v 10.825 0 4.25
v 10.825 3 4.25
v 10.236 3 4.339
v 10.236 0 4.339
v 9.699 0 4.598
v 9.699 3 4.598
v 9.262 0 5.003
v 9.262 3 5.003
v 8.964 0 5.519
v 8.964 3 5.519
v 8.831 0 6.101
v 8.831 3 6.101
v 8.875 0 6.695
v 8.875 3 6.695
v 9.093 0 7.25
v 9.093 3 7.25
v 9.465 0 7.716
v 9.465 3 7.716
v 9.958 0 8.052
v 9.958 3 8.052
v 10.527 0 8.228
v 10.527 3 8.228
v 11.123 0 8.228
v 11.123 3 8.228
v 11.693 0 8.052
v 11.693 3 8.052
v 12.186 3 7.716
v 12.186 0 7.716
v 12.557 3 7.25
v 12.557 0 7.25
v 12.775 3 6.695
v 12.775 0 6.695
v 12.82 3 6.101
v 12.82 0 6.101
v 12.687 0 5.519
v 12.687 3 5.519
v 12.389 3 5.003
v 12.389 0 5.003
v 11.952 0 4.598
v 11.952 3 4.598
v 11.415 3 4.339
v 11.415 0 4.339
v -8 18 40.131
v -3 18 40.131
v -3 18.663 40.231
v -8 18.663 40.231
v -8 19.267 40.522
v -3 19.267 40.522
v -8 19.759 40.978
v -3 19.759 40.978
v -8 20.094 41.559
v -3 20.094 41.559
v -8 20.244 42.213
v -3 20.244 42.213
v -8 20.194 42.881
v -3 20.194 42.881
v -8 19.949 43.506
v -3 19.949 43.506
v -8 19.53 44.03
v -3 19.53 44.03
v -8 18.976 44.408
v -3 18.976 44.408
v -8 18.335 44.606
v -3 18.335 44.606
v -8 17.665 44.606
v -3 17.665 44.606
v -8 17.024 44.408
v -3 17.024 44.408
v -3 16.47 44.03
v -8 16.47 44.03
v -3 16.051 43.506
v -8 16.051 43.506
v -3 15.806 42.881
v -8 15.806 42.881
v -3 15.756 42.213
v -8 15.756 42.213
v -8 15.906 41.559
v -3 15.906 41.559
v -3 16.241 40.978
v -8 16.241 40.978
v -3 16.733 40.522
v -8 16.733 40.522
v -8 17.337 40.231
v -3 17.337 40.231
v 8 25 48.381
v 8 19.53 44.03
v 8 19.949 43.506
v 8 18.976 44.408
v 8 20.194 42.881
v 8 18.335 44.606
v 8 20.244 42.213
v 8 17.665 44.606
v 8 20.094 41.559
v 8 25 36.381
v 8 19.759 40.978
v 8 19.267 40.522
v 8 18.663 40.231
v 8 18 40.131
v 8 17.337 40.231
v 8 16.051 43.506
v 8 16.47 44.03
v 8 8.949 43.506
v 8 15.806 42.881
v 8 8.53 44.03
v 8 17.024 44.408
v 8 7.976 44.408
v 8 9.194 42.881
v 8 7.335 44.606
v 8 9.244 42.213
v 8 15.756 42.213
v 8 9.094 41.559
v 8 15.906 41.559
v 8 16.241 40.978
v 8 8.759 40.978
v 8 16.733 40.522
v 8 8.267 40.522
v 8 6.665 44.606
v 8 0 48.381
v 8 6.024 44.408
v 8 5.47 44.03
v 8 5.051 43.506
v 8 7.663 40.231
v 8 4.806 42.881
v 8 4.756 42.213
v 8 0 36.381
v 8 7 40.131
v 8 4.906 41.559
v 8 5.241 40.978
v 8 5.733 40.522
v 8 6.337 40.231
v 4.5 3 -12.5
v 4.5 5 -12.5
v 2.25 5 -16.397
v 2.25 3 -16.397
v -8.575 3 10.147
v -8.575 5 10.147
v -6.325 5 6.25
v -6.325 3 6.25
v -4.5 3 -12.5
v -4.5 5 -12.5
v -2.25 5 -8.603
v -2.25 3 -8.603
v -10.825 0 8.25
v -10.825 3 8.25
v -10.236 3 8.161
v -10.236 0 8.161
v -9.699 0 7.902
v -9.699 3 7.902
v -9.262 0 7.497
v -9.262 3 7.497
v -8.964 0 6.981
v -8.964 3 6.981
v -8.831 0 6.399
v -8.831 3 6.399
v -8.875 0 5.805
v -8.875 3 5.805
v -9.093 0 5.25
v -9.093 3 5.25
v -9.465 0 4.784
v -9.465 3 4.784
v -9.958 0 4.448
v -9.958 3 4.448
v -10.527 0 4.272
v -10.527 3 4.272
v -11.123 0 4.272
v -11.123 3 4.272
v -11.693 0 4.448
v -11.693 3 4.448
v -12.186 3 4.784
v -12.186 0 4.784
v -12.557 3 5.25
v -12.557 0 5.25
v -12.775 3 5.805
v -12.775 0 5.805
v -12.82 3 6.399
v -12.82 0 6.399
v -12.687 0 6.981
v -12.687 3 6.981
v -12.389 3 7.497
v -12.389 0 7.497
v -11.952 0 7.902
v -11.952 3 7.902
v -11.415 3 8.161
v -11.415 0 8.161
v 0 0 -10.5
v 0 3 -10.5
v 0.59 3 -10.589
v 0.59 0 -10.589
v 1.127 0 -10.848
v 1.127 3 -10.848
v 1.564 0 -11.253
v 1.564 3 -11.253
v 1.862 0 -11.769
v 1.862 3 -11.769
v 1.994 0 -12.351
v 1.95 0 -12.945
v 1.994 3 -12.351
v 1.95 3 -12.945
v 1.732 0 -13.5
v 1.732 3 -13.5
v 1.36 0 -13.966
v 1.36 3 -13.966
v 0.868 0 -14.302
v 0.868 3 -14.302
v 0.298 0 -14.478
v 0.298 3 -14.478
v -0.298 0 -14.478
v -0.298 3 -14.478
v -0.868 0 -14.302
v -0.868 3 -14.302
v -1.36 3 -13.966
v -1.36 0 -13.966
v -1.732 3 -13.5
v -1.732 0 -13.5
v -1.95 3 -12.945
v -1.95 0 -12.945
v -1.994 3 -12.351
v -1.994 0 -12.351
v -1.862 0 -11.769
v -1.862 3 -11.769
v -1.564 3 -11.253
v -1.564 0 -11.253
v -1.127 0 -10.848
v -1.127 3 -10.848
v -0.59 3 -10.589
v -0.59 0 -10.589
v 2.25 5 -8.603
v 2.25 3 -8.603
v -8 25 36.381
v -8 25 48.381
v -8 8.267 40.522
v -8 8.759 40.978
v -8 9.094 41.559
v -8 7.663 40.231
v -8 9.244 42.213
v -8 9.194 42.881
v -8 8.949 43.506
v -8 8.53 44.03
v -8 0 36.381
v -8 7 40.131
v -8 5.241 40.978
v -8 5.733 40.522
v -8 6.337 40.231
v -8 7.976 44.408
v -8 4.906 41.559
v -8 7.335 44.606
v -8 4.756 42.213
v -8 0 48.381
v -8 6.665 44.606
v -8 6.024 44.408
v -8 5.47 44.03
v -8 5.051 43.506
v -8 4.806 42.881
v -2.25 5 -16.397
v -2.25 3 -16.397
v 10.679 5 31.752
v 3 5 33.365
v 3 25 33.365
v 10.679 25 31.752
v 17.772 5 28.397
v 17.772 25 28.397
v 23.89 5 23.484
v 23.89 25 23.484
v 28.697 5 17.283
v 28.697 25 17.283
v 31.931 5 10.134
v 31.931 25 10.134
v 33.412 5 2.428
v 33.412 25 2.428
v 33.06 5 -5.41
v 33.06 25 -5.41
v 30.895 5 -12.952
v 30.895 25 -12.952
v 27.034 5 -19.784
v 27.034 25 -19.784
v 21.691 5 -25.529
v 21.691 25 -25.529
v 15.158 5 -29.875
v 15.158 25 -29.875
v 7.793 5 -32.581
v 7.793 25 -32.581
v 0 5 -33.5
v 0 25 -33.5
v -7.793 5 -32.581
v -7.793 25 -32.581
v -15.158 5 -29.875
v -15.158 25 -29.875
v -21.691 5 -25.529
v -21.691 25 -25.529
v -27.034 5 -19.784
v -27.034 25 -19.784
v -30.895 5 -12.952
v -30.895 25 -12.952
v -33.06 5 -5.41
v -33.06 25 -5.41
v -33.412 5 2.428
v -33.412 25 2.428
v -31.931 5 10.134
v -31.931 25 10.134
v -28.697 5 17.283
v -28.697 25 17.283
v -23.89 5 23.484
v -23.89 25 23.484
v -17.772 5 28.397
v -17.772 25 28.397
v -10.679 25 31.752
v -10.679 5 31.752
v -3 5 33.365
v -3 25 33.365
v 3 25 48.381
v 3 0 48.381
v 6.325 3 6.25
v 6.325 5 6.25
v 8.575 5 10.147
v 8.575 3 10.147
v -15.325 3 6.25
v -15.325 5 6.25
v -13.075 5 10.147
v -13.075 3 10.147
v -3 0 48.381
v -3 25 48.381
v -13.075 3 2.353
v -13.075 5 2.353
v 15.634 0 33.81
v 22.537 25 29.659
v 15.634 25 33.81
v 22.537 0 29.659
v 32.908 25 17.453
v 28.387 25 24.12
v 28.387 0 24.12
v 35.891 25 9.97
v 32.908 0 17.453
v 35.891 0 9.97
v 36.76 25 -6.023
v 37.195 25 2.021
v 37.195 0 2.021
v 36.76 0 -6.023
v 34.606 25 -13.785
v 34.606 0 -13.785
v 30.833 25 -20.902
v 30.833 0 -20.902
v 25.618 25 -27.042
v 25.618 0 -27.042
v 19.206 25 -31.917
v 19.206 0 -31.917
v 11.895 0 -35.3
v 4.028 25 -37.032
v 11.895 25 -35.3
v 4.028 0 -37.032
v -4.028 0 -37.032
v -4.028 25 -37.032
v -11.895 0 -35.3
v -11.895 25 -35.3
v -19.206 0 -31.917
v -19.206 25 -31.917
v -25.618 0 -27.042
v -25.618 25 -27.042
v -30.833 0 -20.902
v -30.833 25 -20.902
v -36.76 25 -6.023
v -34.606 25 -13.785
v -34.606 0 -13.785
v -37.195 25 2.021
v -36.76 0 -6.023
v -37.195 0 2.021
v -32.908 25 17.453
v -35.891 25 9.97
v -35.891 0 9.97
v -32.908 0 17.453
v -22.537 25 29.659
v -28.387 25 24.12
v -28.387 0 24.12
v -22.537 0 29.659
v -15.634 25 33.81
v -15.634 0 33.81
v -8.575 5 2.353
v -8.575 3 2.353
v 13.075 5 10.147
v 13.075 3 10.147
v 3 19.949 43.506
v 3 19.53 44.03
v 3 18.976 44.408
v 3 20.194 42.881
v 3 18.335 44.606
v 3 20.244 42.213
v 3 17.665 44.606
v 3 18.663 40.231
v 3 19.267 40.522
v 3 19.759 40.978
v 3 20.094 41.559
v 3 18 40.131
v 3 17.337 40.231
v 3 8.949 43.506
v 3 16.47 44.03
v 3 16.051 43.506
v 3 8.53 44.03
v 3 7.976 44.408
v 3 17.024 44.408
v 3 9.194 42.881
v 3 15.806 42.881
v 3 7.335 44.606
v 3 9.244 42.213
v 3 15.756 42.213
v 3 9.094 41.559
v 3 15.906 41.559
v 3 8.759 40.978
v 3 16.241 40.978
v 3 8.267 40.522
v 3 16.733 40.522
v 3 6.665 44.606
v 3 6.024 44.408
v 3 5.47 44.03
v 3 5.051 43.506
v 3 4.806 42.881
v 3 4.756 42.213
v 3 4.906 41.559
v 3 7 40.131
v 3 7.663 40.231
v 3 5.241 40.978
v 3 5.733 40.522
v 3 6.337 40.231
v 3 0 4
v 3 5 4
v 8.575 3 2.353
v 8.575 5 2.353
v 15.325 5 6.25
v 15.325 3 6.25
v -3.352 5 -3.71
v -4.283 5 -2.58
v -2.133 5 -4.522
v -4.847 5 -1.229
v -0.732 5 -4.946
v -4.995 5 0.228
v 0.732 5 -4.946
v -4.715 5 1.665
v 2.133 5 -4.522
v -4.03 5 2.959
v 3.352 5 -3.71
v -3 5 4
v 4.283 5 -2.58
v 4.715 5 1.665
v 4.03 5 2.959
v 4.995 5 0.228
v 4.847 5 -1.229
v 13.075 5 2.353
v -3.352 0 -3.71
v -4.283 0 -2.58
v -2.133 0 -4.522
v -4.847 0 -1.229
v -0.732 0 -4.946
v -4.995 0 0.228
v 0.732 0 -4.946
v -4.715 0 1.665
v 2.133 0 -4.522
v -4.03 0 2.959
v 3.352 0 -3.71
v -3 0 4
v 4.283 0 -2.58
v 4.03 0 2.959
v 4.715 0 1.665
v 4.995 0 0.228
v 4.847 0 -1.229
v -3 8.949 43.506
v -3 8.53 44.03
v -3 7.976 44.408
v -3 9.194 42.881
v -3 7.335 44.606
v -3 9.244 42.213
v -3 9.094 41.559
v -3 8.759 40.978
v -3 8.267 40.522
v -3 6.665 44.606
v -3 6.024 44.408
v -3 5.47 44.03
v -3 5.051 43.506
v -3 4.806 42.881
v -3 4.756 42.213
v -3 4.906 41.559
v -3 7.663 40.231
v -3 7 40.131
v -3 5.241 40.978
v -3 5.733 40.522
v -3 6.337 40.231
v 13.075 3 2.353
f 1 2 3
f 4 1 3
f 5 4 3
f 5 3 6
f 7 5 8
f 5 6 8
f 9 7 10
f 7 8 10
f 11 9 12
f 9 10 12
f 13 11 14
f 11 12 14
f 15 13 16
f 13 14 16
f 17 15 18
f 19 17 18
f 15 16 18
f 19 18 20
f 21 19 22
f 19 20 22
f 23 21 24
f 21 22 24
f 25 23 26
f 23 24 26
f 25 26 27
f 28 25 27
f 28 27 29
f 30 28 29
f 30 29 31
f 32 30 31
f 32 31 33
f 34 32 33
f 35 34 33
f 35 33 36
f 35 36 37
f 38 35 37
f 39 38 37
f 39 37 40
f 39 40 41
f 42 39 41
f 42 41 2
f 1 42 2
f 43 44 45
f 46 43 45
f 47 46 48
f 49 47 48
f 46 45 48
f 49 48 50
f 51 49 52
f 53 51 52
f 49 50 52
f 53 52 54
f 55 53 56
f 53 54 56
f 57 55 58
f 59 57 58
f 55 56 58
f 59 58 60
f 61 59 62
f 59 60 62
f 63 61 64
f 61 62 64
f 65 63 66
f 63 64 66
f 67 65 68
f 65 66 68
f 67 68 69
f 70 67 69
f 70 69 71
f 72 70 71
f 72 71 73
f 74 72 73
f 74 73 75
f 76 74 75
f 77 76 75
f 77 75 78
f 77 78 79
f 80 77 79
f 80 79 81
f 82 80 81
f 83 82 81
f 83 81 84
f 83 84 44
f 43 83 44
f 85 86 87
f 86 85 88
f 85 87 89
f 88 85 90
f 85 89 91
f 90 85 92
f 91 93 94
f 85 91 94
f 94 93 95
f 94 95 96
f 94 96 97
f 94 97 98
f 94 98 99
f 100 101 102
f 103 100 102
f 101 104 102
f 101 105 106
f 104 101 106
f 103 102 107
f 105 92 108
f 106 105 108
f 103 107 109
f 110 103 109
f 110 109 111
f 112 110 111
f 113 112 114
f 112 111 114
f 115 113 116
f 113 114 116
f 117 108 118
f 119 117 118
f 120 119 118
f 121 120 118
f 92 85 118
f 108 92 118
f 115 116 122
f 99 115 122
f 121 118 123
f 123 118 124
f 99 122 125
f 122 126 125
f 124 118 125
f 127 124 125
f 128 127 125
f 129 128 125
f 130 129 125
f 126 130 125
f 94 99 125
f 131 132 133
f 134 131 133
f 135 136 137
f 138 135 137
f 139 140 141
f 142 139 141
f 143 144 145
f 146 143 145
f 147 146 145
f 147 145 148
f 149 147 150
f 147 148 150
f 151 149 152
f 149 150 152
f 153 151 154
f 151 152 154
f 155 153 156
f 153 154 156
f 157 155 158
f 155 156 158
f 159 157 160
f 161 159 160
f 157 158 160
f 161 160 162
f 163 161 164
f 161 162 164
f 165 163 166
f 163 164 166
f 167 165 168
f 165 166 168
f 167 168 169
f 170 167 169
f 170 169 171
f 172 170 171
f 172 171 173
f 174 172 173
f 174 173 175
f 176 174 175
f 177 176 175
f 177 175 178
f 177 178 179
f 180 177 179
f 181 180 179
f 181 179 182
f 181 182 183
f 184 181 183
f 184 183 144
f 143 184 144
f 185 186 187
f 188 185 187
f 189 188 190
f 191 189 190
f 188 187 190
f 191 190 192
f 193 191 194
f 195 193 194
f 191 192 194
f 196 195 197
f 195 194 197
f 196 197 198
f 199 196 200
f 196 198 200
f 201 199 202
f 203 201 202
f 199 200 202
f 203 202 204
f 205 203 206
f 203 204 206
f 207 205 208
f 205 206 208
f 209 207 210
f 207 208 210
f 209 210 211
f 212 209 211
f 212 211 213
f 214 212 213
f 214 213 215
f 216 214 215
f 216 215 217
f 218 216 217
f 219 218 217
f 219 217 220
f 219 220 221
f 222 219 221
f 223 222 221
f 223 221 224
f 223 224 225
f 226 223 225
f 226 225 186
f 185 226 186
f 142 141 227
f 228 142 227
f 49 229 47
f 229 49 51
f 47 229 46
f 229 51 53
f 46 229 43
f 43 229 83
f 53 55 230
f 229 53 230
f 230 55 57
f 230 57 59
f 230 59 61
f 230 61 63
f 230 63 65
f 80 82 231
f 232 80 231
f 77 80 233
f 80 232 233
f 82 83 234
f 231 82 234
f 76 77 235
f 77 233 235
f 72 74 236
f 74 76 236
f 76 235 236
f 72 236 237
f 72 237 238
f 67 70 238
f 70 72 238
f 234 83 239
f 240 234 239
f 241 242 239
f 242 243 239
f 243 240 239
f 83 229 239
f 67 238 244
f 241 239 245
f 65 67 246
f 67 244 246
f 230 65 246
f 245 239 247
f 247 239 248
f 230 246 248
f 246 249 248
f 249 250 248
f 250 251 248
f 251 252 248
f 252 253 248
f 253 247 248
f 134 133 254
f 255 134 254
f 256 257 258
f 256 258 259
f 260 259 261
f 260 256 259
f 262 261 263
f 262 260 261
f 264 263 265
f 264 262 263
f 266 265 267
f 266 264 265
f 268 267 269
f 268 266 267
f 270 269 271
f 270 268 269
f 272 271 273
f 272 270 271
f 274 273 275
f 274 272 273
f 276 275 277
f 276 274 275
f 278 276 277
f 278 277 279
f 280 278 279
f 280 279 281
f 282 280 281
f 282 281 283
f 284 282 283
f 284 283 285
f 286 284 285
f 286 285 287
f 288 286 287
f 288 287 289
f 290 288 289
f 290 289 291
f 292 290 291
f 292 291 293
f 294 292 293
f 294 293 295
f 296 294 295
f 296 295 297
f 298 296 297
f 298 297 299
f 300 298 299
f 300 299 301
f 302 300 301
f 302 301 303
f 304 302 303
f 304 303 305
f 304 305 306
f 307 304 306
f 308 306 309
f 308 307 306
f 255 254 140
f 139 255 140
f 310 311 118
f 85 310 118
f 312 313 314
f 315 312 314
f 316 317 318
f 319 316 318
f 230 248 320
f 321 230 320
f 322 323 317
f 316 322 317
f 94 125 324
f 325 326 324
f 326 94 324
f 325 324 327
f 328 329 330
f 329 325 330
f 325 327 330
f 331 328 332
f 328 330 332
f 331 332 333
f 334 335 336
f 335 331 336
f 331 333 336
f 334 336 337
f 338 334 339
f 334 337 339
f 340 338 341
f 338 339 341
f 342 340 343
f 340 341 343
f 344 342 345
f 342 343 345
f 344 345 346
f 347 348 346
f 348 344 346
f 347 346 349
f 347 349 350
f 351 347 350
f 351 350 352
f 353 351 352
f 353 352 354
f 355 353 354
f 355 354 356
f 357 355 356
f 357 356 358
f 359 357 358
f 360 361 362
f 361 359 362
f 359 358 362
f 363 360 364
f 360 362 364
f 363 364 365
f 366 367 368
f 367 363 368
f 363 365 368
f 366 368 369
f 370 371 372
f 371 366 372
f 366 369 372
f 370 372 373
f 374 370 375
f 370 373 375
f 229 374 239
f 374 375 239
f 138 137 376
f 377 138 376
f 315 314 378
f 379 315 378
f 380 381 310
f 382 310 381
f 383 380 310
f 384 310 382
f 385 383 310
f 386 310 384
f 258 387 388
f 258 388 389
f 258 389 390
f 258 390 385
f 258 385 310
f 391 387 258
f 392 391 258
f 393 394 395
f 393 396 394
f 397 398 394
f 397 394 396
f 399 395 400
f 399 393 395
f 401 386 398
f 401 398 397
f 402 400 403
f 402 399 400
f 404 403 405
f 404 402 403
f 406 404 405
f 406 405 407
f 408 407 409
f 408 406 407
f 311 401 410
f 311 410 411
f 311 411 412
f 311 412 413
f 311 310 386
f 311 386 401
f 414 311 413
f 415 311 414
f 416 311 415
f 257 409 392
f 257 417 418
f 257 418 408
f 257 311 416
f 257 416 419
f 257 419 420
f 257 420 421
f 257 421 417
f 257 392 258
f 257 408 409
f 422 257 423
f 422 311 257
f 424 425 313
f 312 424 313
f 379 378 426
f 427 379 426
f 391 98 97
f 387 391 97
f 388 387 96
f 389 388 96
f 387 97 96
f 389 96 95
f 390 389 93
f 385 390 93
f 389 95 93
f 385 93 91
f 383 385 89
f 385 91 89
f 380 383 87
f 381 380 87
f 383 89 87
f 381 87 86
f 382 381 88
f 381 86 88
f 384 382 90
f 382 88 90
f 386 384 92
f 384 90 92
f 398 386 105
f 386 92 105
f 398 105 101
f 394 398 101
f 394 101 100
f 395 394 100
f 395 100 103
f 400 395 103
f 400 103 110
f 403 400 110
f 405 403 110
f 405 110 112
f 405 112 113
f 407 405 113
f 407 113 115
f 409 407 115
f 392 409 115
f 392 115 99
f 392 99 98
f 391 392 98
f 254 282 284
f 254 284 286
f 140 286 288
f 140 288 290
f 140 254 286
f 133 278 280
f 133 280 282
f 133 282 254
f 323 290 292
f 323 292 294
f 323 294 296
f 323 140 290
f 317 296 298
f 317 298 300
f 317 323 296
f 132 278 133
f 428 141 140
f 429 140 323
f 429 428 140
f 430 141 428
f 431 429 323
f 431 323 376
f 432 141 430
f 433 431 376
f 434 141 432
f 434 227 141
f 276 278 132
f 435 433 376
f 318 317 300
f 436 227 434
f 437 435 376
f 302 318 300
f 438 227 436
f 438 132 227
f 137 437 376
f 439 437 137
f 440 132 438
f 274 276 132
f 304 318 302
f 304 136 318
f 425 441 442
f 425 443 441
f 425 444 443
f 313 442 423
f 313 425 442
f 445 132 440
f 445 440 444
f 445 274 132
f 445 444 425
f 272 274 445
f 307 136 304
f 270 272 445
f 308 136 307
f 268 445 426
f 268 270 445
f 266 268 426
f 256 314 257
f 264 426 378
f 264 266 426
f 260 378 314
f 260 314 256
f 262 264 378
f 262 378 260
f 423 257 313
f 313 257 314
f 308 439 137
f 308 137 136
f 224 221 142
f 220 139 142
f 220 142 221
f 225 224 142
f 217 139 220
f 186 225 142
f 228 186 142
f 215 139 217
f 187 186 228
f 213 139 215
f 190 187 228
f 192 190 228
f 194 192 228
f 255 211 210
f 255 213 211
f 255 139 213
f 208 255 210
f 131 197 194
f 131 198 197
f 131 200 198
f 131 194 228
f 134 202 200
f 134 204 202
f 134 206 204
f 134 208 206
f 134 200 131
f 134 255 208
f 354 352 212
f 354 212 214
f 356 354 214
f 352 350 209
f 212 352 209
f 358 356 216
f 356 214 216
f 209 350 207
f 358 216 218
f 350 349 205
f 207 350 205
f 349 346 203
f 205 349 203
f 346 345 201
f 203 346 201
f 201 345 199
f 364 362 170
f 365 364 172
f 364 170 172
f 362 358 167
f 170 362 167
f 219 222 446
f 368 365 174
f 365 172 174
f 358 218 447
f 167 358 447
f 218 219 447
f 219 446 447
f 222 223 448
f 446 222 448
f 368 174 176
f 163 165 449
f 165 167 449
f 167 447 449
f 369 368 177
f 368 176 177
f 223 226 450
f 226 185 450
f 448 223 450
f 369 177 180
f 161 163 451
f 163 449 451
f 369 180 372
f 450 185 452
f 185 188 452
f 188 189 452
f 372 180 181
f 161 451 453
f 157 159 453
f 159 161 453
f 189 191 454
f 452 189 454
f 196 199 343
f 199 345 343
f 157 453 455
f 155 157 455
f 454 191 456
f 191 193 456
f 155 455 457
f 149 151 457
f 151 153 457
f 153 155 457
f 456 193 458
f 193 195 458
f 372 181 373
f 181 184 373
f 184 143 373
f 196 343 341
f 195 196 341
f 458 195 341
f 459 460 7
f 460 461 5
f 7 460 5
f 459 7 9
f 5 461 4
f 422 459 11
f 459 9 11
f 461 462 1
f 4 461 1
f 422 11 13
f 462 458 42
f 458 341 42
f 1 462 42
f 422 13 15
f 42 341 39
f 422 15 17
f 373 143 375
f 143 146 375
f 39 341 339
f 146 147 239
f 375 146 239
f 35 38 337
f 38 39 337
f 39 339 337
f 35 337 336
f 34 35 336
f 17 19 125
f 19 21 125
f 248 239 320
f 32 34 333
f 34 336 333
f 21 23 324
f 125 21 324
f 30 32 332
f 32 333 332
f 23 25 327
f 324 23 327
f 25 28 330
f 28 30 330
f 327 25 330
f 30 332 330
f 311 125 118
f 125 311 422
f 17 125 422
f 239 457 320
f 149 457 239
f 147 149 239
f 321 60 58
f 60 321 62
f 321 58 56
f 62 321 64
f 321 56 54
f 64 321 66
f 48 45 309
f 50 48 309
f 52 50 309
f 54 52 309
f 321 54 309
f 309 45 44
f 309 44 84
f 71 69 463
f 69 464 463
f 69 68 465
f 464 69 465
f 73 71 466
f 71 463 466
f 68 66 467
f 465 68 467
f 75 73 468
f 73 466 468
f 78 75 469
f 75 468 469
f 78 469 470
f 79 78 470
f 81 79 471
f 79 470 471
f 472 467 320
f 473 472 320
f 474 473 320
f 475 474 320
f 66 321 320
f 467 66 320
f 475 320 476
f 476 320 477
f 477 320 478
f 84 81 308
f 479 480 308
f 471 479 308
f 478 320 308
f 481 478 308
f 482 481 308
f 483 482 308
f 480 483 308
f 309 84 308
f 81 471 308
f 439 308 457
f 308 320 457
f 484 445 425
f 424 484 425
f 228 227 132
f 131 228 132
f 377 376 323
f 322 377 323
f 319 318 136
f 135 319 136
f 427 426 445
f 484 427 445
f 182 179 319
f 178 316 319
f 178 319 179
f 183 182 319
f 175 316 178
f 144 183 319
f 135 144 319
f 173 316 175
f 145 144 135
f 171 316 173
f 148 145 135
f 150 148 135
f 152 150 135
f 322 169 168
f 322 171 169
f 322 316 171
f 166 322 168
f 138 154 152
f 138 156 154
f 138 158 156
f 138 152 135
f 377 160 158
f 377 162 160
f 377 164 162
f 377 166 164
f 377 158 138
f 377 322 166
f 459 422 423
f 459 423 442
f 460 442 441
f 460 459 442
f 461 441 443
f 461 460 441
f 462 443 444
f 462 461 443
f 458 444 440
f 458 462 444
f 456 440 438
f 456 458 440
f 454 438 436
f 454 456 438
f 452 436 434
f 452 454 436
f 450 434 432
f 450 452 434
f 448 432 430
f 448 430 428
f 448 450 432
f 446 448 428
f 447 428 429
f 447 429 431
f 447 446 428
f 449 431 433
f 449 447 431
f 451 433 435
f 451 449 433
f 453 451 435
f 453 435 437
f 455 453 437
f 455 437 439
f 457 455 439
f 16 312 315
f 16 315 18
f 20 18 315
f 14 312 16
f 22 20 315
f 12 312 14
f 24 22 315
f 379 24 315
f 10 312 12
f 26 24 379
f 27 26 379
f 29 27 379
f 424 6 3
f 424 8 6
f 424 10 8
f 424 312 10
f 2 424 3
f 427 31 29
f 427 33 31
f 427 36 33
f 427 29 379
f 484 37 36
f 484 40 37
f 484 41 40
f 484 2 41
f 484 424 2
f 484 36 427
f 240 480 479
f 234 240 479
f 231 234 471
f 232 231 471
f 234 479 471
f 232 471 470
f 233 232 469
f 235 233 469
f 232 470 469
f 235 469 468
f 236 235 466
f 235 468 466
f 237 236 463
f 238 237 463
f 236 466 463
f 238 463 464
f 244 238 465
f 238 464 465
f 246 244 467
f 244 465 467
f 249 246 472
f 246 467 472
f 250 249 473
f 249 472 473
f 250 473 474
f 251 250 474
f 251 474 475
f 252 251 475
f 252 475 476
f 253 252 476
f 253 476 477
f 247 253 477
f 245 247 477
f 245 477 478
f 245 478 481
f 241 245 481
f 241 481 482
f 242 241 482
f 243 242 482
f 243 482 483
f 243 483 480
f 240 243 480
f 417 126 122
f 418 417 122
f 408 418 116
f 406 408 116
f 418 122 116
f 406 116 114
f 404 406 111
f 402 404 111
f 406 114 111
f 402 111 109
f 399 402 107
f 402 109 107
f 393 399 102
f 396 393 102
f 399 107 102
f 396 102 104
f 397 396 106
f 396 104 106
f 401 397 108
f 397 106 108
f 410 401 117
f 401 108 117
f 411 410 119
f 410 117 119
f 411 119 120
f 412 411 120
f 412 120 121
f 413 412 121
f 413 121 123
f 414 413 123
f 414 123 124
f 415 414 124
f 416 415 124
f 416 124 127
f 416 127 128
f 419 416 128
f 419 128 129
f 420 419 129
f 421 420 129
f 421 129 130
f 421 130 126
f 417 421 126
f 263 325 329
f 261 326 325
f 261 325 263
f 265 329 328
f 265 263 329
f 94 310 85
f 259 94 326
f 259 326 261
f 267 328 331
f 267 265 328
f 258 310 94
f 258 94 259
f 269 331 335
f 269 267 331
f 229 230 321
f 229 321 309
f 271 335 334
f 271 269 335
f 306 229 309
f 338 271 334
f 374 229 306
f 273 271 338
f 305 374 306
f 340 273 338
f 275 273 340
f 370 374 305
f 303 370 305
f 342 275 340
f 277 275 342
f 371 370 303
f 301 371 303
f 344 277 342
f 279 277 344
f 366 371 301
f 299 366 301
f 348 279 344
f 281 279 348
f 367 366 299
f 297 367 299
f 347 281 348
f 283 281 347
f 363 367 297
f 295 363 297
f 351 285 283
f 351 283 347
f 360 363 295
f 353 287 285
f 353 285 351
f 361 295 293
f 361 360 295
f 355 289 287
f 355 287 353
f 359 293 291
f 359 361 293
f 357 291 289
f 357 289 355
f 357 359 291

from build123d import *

# Parameters (mm, degrees)
SKETCH_1_R            = 37.25
SKETCH_1_R_2          = 33.5
MAIN_DEPTH            = 25
SKETCH_3_R            = 33.5
SKETCH_3_R_2          = 5
STOP_DEPTH            = 5
LOCK_DEPTH            = 25
SKETCH_5_W            = 6
SKETCH_5_H            = 48.380798507
SLOT_DEPTH            = 25
SKETCH_6_R            = 2.25
SMALL_HOLES_DEPTH     = 71.804407802
HOLES_FOR_BOLTS_REACH = 66.252
SKETCH_7_R            = 2
HEXAGONS_DEPTH        = 2


with BuildPart() as part:
    # Эскиз1 → main (new body)
    with BuildSketch(Plane(origin=(0, 0, 0), x_dir=(1, 0, 0), z_dir=(0, 1, 0))):
        with Locations(Location((0, 0, 0), (0, 0, 90))):
            Circle(SKETCH_1_R)
        with Locations(Location((0, 0, 0), (0, 0, 270))):
            Circle(SKETCH_1_R_2, mode=Mode.SUBTRACT)
    extrude(amount=MAIN_DEPTH)

    # Эскиз3 → stop (add)
    with BuildSketch(Plane(origin=(0, 0, 0), x_dir=(1, 0, 0), z_dir=(0, 1, 0))):
        with Locations(Location((0, 0, 0), (0, 0, 270))):
            Circle(SKETCH_3_R)
        with Locations(Location((0, 0, 0), (0, 0, 270))):
            Circle(SKETCH_3_R_2, mode=Mode.SUBTRACT)
    extrude(amount=STOP_DEPTH)

    # Эскиз4 → lock (add)
    with BuildSketch(Plane(origin=(0, 0, 0), x_dir=(1, 0, 0), z_dir=(0, 1, 0))):
        with BuildLine():
            Line((-8, -36.380798507), (-8, -48.380798507))
            Line((-8, -48.380798507), (8, -48.380798507))
            Line((8, -48.380798507), (8, -36.380798507))
            ThreePointArc((8, -36.380798507), (0, -37.25), (-8, -36.380798507))
        make_face()
    extrude(amount=LOCK_DEPTH)

    # Эскиз5 → slot (cut)
    with BuildSketch(Plane(origin=(0, 0, 0), x_dir=(1, 0, 0), z_dir=(0, 1, 0))):
        with Locations((0, -24.190399254)):
            Rectangle(SKETCH_5_W, SKETCH_5_H)
    extrude(amount=SLOT_DEPTH, mode=Mode.SUBTRACT)

    # Эскиз6 → small holes (cut, through all)
    with BuildSketch(Plane(origin=(8, 0, 0), x_dir=(0, 0, -1), z_dir=(1, 0, 0))):
        with Locations((-42.380798507, 7)):
            Circle(SKETCH_6_R)
        with Locations((-42.380798507, 18)):
            Circle(SKETCH_6_R)
    extrude(amount=-SMALL_HOLES_DEPTH, mode=Mode.SUBTRACT)

    # Эскиз7 → holes for bolts (cut, up to next)
    with BuildSketch(Plane(origin=(0, 5, 0), x_dir=(1, 0, 0), z_dir=(0, 1, 0)), mode=Mode.PRIVATE) as holes_for_bolts_sk1:
        with Locations(Location((0, 12.5, 0), (0, 0, 270))):
            Circle(SKETCH_7_R)
    holes_for_bolts_tool1 = extrude(holes_for_bolts_sk1.sketch, amount=-HOLES_FOR_BOLTS_REACH, mode=Mode.PRIVATE) & part.part
    # Эскиз7 → holes for bolts (cut, up to next)
    with BuildSketch(Plane(origin=(0, 5, 0), x_dir=(1, 0, 0), z_dir=(0, 1, 0)), mode=Mode.PRIVATE) as holes_for_bolts_sk2:
        with Locations(Location((-10.825317547, -6.25, 0), (0, 0, 270))):
            Circle(SKETCH_7_R)
    holes_for_bolts_tool2 = extrude(holes_for_bolts_sk2.sketch, amount=-HOLES_FOR_BOLTS_REACH, mode=Mode.PRIVATE) & part.part
    # Эскиз7 → holes for bolts (cut, up to next)
    with BuildSketch(Plane(origin=(0, 5, 0), x_dir=(1, 0, 0), z_dir=(0, 1, 0)), mode=Mode.PRIVATE) as holes_for_bolts_sk3:
        with Locations(Location((10.825317547, -6.25, 0), (0, 0, 90))):
            Circle(SKETCH_7_R)
    holes_for_bolts_tool3 = extrude(holes_for_bolts_sk3.sketch, amount=-HOLES_FOR_BOLTS_REACH, mode=Mode.PRIVATE) & part.part
    add(holes_for_bolts_tool1.solids().sort_by_distance((0, 5, -12.5))[0], mode=Mode.SUBTRACT)
    add(holes_for_bolts_tool2.solids().sort_by_distance((-10.825318, 5, 6.25))[0], mode=Mode.SUBTRACT)
    add(holes_for_bolts_tool3.solids().sort_by_distance((10.825318, 5, 6.25))[0], mode=Mode.SUBTRACT)

    # Эскиз8 → hexagons (cut)
    with BuildSketch(Plane(origin=(0, 5, 0), x_dir=(1, 0, 0), z_dir=(0, 1, 0))):
        Polygon((-8.575317547, -10.147114317), (-6.325317547, -6.25), (-8.575317547, -2.352885683), (-13.075317547, -2.352885683), (-15.325317547, -6.25), (-13.075317547, -10.147114317), align=None)
        Polygon((13.075317547, -10.147114317), (15.325317547, -6.25), (13.075317547, -2.352885683), (8.575317547, -2.352885683), (6.325317547, -6.25), (8.575317547, -10.147114317), align=None)
        Polygon((2.25, 8.602885683), (4.5, 12.5), (2.25, 16.397114317), (-2.25, 16.397114317), (-4.5, 12.5), (-2.25, 8.602885683), align=None)
    extrude(amount=-HEXAGONS_DEPTH, mode=Mode.SUBTRACT)


solid = part.part
